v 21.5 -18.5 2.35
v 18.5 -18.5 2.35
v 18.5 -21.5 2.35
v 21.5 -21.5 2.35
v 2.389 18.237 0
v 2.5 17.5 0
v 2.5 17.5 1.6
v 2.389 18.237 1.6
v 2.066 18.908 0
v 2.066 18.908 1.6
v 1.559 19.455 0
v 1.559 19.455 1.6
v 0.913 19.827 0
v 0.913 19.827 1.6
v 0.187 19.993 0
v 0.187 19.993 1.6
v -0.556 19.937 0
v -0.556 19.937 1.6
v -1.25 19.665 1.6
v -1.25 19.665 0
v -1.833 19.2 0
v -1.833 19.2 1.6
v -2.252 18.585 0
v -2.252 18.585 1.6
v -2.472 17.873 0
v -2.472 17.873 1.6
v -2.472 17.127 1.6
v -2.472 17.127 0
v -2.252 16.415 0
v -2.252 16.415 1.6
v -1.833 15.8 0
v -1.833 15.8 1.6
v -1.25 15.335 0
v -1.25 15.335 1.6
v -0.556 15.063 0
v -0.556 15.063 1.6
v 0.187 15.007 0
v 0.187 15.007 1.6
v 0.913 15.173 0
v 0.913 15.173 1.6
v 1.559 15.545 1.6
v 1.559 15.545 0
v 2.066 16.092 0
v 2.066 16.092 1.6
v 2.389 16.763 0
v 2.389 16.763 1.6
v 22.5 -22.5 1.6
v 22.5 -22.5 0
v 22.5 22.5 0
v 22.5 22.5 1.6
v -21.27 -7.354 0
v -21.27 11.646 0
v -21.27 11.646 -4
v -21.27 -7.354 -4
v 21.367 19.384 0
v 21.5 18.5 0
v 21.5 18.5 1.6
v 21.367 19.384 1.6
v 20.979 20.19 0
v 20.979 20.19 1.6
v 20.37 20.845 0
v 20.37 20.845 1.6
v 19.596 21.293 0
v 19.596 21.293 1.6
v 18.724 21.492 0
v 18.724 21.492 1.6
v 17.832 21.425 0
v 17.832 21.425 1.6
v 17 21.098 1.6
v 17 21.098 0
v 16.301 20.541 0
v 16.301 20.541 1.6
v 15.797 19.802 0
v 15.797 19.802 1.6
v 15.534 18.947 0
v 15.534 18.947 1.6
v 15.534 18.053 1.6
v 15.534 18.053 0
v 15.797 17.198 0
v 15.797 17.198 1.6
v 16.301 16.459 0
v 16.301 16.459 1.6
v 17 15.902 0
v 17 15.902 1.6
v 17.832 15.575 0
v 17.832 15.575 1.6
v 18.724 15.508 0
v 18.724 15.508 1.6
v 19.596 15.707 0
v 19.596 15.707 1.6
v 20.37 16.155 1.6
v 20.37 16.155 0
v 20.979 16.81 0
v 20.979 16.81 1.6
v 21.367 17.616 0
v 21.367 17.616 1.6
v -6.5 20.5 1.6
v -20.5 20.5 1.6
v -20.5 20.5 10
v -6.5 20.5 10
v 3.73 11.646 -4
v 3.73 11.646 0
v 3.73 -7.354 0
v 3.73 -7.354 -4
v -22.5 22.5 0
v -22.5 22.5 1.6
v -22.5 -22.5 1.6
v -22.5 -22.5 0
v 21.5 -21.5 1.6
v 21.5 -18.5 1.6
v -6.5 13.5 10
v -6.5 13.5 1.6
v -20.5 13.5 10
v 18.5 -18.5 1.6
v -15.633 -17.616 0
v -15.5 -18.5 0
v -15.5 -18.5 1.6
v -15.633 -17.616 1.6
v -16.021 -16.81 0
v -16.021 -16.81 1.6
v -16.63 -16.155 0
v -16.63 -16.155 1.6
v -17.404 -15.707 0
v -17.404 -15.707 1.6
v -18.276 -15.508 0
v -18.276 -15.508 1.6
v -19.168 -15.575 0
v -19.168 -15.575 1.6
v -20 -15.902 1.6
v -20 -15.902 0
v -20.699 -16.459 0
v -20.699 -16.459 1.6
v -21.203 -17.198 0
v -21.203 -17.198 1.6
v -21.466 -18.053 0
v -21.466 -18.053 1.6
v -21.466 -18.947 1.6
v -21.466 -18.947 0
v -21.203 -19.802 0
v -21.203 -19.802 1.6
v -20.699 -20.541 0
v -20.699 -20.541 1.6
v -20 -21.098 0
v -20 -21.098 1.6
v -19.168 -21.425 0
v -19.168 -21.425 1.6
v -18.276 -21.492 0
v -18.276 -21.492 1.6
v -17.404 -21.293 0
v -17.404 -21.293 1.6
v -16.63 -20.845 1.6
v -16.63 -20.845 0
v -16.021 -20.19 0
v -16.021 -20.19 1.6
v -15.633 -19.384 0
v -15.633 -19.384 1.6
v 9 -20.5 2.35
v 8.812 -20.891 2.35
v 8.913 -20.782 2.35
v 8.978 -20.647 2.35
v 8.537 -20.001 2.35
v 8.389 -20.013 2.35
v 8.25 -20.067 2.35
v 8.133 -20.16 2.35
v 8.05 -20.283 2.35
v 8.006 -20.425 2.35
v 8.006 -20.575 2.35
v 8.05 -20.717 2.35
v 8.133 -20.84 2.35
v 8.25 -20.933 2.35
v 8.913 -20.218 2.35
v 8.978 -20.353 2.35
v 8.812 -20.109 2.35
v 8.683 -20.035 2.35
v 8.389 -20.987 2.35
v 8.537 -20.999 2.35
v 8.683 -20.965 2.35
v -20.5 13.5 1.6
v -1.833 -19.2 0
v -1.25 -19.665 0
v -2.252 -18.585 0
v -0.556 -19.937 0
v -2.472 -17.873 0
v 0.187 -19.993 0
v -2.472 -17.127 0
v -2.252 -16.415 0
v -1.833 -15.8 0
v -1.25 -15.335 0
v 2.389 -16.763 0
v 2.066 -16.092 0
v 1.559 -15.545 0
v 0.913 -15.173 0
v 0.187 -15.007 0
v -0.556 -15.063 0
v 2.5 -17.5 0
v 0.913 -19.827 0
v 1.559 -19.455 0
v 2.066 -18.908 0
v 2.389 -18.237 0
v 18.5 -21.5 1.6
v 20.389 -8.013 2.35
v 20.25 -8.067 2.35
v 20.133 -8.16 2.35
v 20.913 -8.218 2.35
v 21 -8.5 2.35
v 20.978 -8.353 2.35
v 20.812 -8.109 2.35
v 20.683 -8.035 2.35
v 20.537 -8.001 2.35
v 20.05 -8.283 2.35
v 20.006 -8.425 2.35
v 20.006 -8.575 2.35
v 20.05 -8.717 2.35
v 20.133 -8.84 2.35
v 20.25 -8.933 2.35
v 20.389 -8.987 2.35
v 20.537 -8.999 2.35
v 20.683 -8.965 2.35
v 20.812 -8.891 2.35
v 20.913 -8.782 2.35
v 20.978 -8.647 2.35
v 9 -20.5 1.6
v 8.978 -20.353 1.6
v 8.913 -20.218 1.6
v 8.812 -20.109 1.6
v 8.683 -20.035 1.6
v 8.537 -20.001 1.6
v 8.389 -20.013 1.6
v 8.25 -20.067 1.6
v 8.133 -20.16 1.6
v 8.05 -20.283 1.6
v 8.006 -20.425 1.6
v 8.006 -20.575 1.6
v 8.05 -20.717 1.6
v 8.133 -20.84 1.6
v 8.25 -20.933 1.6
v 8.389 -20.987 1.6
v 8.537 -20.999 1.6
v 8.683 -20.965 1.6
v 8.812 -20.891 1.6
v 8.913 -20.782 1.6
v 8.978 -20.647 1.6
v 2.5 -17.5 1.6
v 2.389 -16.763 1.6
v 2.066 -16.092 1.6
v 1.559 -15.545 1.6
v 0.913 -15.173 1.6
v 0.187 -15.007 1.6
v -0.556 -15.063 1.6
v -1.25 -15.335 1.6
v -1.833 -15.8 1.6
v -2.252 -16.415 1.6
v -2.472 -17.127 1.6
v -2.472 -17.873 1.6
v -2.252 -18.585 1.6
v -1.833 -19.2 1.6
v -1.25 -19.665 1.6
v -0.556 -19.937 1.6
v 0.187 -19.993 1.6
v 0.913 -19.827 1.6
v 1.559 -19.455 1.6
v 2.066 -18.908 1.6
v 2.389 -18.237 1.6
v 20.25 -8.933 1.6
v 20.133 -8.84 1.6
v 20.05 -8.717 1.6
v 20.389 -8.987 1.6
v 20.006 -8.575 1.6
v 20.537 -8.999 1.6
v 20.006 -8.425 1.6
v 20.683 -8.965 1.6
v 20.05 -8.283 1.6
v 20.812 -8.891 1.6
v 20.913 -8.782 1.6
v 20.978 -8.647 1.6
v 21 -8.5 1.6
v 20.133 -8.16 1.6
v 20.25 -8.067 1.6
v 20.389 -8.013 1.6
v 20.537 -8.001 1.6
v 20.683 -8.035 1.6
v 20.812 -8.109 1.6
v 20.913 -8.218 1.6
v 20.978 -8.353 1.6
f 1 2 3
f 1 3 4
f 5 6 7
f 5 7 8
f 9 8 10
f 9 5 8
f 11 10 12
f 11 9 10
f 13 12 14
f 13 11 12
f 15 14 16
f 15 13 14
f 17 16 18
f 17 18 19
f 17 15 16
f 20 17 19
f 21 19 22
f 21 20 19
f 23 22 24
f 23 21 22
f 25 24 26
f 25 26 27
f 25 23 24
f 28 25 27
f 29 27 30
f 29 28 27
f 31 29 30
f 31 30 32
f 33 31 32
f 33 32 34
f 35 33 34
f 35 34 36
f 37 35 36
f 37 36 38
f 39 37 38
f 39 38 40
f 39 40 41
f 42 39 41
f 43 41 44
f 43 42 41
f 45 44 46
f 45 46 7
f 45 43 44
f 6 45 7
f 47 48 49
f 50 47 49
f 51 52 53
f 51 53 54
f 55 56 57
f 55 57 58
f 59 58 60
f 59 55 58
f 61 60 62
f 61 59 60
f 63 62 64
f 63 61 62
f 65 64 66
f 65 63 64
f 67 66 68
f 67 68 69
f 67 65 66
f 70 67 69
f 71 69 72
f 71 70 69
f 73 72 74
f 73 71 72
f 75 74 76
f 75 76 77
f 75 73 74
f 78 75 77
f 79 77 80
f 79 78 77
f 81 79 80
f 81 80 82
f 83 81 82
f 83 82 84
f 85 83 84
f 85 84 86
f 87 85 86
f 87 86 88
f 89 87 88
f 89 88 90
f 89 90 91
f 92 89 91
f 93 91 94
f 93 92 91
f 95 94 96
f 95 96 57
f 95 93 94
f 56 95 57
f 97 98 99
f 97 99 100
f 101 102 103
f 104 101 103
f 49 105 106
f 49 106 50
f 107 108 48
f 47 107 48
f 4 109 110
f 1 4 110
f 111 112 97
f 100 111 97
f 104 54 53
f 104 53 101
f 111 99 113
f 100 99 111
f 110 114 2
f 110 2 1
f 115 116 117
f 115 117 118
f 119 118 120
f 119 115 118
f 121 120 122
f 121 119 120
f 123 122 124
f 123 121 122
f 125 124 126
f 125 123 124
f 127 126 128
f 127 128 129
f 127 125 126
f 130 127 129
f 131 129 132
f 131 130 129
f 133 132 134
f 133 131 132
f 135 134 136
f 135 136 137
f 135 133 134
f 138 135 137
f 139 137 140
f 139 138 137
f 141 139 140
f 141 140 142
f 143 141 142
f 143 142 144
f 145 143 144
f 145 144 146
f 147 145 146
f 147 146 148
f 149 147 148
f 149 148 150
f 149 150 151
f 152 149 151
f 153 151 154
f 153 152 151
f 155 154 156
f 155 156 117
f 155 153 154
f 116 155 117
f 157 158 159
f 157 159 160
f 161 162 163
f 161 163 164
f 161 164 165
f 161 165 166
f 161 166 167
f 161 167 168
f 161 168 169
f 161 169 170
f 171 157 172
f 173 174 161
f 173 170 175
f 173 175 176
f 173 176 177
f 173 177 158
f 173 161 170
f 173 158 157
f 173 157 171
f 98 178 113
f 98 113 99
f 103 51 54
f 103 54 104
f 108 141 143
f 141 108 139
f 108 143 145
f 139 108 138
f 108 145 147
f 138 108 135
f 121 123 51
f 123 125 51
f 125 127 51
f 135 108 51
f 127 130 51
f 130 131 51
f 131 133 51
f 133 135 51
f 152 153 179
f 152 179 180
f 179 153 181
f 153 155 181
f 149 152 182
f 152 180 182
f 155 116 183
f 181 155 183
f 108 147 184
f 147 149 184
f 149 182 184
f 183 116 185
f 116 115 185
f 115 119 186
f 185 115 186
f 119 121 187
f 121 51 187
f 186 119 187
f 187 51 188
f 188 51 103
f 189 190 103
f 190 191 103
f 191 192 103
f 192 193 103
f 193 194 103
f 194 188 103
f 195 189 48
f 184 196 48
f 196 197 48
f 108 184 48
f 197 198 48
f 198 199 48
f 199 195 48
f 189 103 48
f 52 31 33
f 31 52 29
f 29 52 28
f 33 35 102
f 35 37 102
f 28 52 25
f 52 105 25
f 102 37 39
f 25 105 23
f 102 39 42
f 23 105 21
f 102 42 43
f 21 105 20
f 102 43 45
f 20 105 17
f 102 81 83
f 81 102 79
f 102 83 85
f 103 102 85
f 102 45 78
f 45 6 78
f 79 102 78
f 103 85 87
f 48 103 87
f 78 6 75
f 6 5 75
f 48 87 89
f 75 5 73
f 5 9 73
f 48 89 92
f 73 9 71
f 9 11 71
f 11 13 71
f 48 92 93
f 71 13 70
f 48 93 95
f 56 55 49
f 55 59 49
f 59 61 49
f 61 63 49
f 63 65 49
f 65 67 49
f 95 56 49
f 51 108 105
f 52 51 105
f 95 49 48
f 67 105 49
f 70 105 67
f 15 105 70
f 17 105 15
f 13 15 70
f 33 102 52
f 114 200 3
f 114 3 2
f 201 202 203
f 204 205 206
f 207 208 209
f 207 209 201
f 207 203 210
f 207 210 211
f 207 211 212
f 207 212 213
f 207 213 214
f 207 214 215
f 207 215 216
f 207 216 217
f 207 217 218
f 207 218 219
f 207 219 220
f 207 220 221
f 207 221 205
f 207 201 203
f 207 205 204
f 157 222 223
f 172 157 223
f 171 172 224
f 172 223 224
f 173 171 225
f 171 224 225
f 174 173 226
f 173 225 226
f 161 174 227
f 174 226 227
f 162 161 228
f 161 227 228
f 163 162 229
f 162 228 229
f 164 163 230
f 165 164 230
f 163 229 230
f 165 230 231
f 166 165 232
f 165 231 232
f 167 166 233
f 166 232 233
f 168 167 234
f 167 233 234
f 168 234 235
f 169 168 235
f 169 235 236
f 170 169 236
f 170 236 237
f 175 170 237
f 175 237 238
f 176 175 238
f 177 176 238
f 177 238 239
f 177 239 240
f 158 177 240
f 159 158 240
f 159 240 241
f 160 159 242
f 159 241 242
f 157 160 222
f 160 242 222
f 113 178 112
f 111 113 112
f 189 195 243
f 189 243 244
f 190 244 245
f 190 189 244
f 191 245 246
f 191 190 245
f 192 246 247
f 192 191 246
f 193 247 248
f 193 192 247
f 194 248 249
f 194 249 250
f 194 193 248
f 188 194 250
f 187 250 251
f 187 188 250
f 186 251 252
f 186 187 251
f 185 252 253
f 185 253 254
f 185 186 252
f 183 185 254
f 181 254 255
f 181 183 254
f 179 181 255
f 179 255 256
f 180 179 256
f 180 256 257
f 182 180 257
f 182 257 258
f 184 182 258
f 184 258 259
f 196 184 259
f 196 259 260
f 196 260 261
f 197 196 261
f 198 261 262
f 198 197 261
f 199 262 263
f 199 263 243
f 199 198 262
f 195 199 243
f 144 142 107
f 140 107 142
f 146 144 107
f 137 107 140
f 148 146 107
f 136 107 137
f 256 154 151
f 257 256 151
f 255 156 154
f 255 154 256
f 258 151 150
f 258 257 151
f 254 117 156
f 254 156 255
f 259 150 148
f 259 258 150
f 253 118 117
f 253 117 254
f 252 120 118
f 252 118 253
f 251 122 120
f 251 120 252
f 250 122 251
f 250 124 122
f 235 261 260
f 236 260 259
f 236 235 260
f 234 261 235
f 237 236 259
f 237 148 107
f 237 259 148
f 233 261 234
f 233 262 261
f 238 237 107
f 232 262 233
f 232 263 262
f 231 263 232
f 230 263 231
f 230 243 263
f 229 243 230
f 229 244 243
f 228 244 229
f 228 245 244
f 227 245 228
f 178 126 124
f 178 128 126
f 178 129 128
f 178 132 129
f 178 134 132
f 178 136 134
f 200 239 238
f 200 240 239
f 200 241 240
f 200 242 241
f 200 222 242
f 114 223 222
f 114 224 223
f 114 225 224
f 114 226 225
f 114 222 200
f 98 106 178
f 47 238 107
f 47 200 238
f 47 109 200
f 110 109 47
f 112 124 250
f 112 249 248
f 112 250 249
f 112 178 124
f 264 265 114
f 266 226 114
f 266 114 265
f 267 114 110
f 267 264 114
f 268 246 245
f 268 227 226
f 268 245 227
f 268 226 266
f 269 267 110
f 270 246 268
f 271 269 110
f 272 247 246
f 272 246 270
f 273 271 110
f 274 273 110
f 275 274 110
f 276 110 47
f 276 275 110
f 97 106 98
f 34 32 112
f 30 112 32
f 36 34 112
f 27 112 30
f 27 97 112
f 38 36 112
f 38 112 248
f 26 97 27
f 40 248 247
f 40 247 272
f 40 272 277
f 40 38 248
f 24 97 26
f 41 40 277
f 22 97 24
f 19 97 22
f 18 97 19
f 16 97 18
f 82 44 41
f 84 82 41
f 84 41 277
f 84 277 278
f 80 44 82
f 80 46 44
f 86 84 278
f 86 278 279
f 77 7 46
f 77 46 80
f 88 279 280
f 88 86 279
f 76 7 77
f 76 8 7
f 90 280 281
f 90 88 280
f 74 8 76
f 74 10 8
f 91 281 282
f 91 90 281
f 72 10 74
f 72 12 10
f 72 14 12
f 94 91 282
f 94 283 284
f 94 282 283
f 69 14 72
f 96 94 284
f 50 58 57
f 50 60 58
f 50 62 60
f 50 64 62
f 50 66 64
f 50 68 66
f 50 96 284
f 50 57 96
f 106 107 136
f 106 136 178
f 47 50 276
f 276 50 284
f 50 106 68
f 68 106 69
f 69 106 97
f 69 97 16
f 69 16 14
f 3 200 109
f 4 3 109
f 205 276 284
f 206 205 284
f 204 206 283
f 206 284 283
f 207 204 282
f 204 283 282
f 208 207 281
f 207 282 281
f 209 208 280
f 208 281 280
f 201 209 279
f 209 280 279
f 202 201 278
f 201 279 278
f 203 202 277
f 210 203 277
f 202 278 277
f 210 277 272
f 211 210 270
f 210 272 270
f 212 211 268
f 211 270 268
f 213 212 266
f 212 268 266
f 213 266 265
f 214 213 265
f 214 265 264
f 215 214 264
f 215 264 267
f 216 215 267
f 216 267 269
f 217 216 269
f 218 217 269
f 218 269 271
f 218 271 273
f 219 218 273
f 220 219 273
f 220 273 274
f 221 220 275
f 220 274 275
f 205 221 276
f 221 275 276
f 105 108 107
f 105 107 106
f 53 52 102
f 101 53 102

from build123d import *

# Parameters (mm, degrees)
F0_W     = 45
F0_H     = 45
F0_R     = 3
F0_R_2   = 2.5
F1_DEPTH = 1.6
F2_W     = 3
F2_H     = 3
F2_R     = 0.5
F3_DEPTH = 0.75
F4_W     = 25
F4_H     = 19
F5_DEPTH = 4
F6_W     = 14
F6_H     = 7
F7_DEPTH = 8.4


with BuildPart() as f1:
    # F0 (on Top) → F1 (new body)
    with BuildSketch(Plane.XY):
        Rectangle(F0_W, F0_H)
        with Locations((-18.5, -18.5)):
            Circle(F0_R, mode=Mode.SUBTRACT)
        with Locations((0, -17.5)):
            Circle(F0_R_2, mode=Mode.SUBTRACT)
        with Locations((0, 17.5)):
            Circle(F0_R_2, mode=Mode.SUBTRACT)
        with Locations((18.5, 18.5)):
            Circle(F0_R, mode=Mode.SUBTRACT)
    extrude(amount=F1_DEPTH)

    # F2 (on face) → F3 (join)
    with BuildSketch(Plane.XY.offset(1.6)):
        with Locations((20, -20)):
            Rectangle(F2_W, F2_H)
        with Locations((20.5, -8.5)):
            Circle(F2_R)
        with Locations((8.5, -20.5)):
            Circle(F2_R)
    extrude(amount=F3_DEPTH)

    # F4 (on face) → F5 (join)
    with BuildSketch(Plane(origin=(0, 0, 0), x_dir=(1, 0, 0), z_dir=(0, 0, -1))):
        with Locations((-8.769828, -2.14642)):
            Rectangle(F4_W, F4_H)
    extrude(amount=F5_DEPTH)

    # F6 (on face) → F7 (join)
    with BuildSketch(Plane.XY.offset(1.6)):
        with Locations((-13.5, 17)):
            Rectangle(F6_W, F6_H)
    extrude(amount=F7_DEPTH)


solid = f1.part
